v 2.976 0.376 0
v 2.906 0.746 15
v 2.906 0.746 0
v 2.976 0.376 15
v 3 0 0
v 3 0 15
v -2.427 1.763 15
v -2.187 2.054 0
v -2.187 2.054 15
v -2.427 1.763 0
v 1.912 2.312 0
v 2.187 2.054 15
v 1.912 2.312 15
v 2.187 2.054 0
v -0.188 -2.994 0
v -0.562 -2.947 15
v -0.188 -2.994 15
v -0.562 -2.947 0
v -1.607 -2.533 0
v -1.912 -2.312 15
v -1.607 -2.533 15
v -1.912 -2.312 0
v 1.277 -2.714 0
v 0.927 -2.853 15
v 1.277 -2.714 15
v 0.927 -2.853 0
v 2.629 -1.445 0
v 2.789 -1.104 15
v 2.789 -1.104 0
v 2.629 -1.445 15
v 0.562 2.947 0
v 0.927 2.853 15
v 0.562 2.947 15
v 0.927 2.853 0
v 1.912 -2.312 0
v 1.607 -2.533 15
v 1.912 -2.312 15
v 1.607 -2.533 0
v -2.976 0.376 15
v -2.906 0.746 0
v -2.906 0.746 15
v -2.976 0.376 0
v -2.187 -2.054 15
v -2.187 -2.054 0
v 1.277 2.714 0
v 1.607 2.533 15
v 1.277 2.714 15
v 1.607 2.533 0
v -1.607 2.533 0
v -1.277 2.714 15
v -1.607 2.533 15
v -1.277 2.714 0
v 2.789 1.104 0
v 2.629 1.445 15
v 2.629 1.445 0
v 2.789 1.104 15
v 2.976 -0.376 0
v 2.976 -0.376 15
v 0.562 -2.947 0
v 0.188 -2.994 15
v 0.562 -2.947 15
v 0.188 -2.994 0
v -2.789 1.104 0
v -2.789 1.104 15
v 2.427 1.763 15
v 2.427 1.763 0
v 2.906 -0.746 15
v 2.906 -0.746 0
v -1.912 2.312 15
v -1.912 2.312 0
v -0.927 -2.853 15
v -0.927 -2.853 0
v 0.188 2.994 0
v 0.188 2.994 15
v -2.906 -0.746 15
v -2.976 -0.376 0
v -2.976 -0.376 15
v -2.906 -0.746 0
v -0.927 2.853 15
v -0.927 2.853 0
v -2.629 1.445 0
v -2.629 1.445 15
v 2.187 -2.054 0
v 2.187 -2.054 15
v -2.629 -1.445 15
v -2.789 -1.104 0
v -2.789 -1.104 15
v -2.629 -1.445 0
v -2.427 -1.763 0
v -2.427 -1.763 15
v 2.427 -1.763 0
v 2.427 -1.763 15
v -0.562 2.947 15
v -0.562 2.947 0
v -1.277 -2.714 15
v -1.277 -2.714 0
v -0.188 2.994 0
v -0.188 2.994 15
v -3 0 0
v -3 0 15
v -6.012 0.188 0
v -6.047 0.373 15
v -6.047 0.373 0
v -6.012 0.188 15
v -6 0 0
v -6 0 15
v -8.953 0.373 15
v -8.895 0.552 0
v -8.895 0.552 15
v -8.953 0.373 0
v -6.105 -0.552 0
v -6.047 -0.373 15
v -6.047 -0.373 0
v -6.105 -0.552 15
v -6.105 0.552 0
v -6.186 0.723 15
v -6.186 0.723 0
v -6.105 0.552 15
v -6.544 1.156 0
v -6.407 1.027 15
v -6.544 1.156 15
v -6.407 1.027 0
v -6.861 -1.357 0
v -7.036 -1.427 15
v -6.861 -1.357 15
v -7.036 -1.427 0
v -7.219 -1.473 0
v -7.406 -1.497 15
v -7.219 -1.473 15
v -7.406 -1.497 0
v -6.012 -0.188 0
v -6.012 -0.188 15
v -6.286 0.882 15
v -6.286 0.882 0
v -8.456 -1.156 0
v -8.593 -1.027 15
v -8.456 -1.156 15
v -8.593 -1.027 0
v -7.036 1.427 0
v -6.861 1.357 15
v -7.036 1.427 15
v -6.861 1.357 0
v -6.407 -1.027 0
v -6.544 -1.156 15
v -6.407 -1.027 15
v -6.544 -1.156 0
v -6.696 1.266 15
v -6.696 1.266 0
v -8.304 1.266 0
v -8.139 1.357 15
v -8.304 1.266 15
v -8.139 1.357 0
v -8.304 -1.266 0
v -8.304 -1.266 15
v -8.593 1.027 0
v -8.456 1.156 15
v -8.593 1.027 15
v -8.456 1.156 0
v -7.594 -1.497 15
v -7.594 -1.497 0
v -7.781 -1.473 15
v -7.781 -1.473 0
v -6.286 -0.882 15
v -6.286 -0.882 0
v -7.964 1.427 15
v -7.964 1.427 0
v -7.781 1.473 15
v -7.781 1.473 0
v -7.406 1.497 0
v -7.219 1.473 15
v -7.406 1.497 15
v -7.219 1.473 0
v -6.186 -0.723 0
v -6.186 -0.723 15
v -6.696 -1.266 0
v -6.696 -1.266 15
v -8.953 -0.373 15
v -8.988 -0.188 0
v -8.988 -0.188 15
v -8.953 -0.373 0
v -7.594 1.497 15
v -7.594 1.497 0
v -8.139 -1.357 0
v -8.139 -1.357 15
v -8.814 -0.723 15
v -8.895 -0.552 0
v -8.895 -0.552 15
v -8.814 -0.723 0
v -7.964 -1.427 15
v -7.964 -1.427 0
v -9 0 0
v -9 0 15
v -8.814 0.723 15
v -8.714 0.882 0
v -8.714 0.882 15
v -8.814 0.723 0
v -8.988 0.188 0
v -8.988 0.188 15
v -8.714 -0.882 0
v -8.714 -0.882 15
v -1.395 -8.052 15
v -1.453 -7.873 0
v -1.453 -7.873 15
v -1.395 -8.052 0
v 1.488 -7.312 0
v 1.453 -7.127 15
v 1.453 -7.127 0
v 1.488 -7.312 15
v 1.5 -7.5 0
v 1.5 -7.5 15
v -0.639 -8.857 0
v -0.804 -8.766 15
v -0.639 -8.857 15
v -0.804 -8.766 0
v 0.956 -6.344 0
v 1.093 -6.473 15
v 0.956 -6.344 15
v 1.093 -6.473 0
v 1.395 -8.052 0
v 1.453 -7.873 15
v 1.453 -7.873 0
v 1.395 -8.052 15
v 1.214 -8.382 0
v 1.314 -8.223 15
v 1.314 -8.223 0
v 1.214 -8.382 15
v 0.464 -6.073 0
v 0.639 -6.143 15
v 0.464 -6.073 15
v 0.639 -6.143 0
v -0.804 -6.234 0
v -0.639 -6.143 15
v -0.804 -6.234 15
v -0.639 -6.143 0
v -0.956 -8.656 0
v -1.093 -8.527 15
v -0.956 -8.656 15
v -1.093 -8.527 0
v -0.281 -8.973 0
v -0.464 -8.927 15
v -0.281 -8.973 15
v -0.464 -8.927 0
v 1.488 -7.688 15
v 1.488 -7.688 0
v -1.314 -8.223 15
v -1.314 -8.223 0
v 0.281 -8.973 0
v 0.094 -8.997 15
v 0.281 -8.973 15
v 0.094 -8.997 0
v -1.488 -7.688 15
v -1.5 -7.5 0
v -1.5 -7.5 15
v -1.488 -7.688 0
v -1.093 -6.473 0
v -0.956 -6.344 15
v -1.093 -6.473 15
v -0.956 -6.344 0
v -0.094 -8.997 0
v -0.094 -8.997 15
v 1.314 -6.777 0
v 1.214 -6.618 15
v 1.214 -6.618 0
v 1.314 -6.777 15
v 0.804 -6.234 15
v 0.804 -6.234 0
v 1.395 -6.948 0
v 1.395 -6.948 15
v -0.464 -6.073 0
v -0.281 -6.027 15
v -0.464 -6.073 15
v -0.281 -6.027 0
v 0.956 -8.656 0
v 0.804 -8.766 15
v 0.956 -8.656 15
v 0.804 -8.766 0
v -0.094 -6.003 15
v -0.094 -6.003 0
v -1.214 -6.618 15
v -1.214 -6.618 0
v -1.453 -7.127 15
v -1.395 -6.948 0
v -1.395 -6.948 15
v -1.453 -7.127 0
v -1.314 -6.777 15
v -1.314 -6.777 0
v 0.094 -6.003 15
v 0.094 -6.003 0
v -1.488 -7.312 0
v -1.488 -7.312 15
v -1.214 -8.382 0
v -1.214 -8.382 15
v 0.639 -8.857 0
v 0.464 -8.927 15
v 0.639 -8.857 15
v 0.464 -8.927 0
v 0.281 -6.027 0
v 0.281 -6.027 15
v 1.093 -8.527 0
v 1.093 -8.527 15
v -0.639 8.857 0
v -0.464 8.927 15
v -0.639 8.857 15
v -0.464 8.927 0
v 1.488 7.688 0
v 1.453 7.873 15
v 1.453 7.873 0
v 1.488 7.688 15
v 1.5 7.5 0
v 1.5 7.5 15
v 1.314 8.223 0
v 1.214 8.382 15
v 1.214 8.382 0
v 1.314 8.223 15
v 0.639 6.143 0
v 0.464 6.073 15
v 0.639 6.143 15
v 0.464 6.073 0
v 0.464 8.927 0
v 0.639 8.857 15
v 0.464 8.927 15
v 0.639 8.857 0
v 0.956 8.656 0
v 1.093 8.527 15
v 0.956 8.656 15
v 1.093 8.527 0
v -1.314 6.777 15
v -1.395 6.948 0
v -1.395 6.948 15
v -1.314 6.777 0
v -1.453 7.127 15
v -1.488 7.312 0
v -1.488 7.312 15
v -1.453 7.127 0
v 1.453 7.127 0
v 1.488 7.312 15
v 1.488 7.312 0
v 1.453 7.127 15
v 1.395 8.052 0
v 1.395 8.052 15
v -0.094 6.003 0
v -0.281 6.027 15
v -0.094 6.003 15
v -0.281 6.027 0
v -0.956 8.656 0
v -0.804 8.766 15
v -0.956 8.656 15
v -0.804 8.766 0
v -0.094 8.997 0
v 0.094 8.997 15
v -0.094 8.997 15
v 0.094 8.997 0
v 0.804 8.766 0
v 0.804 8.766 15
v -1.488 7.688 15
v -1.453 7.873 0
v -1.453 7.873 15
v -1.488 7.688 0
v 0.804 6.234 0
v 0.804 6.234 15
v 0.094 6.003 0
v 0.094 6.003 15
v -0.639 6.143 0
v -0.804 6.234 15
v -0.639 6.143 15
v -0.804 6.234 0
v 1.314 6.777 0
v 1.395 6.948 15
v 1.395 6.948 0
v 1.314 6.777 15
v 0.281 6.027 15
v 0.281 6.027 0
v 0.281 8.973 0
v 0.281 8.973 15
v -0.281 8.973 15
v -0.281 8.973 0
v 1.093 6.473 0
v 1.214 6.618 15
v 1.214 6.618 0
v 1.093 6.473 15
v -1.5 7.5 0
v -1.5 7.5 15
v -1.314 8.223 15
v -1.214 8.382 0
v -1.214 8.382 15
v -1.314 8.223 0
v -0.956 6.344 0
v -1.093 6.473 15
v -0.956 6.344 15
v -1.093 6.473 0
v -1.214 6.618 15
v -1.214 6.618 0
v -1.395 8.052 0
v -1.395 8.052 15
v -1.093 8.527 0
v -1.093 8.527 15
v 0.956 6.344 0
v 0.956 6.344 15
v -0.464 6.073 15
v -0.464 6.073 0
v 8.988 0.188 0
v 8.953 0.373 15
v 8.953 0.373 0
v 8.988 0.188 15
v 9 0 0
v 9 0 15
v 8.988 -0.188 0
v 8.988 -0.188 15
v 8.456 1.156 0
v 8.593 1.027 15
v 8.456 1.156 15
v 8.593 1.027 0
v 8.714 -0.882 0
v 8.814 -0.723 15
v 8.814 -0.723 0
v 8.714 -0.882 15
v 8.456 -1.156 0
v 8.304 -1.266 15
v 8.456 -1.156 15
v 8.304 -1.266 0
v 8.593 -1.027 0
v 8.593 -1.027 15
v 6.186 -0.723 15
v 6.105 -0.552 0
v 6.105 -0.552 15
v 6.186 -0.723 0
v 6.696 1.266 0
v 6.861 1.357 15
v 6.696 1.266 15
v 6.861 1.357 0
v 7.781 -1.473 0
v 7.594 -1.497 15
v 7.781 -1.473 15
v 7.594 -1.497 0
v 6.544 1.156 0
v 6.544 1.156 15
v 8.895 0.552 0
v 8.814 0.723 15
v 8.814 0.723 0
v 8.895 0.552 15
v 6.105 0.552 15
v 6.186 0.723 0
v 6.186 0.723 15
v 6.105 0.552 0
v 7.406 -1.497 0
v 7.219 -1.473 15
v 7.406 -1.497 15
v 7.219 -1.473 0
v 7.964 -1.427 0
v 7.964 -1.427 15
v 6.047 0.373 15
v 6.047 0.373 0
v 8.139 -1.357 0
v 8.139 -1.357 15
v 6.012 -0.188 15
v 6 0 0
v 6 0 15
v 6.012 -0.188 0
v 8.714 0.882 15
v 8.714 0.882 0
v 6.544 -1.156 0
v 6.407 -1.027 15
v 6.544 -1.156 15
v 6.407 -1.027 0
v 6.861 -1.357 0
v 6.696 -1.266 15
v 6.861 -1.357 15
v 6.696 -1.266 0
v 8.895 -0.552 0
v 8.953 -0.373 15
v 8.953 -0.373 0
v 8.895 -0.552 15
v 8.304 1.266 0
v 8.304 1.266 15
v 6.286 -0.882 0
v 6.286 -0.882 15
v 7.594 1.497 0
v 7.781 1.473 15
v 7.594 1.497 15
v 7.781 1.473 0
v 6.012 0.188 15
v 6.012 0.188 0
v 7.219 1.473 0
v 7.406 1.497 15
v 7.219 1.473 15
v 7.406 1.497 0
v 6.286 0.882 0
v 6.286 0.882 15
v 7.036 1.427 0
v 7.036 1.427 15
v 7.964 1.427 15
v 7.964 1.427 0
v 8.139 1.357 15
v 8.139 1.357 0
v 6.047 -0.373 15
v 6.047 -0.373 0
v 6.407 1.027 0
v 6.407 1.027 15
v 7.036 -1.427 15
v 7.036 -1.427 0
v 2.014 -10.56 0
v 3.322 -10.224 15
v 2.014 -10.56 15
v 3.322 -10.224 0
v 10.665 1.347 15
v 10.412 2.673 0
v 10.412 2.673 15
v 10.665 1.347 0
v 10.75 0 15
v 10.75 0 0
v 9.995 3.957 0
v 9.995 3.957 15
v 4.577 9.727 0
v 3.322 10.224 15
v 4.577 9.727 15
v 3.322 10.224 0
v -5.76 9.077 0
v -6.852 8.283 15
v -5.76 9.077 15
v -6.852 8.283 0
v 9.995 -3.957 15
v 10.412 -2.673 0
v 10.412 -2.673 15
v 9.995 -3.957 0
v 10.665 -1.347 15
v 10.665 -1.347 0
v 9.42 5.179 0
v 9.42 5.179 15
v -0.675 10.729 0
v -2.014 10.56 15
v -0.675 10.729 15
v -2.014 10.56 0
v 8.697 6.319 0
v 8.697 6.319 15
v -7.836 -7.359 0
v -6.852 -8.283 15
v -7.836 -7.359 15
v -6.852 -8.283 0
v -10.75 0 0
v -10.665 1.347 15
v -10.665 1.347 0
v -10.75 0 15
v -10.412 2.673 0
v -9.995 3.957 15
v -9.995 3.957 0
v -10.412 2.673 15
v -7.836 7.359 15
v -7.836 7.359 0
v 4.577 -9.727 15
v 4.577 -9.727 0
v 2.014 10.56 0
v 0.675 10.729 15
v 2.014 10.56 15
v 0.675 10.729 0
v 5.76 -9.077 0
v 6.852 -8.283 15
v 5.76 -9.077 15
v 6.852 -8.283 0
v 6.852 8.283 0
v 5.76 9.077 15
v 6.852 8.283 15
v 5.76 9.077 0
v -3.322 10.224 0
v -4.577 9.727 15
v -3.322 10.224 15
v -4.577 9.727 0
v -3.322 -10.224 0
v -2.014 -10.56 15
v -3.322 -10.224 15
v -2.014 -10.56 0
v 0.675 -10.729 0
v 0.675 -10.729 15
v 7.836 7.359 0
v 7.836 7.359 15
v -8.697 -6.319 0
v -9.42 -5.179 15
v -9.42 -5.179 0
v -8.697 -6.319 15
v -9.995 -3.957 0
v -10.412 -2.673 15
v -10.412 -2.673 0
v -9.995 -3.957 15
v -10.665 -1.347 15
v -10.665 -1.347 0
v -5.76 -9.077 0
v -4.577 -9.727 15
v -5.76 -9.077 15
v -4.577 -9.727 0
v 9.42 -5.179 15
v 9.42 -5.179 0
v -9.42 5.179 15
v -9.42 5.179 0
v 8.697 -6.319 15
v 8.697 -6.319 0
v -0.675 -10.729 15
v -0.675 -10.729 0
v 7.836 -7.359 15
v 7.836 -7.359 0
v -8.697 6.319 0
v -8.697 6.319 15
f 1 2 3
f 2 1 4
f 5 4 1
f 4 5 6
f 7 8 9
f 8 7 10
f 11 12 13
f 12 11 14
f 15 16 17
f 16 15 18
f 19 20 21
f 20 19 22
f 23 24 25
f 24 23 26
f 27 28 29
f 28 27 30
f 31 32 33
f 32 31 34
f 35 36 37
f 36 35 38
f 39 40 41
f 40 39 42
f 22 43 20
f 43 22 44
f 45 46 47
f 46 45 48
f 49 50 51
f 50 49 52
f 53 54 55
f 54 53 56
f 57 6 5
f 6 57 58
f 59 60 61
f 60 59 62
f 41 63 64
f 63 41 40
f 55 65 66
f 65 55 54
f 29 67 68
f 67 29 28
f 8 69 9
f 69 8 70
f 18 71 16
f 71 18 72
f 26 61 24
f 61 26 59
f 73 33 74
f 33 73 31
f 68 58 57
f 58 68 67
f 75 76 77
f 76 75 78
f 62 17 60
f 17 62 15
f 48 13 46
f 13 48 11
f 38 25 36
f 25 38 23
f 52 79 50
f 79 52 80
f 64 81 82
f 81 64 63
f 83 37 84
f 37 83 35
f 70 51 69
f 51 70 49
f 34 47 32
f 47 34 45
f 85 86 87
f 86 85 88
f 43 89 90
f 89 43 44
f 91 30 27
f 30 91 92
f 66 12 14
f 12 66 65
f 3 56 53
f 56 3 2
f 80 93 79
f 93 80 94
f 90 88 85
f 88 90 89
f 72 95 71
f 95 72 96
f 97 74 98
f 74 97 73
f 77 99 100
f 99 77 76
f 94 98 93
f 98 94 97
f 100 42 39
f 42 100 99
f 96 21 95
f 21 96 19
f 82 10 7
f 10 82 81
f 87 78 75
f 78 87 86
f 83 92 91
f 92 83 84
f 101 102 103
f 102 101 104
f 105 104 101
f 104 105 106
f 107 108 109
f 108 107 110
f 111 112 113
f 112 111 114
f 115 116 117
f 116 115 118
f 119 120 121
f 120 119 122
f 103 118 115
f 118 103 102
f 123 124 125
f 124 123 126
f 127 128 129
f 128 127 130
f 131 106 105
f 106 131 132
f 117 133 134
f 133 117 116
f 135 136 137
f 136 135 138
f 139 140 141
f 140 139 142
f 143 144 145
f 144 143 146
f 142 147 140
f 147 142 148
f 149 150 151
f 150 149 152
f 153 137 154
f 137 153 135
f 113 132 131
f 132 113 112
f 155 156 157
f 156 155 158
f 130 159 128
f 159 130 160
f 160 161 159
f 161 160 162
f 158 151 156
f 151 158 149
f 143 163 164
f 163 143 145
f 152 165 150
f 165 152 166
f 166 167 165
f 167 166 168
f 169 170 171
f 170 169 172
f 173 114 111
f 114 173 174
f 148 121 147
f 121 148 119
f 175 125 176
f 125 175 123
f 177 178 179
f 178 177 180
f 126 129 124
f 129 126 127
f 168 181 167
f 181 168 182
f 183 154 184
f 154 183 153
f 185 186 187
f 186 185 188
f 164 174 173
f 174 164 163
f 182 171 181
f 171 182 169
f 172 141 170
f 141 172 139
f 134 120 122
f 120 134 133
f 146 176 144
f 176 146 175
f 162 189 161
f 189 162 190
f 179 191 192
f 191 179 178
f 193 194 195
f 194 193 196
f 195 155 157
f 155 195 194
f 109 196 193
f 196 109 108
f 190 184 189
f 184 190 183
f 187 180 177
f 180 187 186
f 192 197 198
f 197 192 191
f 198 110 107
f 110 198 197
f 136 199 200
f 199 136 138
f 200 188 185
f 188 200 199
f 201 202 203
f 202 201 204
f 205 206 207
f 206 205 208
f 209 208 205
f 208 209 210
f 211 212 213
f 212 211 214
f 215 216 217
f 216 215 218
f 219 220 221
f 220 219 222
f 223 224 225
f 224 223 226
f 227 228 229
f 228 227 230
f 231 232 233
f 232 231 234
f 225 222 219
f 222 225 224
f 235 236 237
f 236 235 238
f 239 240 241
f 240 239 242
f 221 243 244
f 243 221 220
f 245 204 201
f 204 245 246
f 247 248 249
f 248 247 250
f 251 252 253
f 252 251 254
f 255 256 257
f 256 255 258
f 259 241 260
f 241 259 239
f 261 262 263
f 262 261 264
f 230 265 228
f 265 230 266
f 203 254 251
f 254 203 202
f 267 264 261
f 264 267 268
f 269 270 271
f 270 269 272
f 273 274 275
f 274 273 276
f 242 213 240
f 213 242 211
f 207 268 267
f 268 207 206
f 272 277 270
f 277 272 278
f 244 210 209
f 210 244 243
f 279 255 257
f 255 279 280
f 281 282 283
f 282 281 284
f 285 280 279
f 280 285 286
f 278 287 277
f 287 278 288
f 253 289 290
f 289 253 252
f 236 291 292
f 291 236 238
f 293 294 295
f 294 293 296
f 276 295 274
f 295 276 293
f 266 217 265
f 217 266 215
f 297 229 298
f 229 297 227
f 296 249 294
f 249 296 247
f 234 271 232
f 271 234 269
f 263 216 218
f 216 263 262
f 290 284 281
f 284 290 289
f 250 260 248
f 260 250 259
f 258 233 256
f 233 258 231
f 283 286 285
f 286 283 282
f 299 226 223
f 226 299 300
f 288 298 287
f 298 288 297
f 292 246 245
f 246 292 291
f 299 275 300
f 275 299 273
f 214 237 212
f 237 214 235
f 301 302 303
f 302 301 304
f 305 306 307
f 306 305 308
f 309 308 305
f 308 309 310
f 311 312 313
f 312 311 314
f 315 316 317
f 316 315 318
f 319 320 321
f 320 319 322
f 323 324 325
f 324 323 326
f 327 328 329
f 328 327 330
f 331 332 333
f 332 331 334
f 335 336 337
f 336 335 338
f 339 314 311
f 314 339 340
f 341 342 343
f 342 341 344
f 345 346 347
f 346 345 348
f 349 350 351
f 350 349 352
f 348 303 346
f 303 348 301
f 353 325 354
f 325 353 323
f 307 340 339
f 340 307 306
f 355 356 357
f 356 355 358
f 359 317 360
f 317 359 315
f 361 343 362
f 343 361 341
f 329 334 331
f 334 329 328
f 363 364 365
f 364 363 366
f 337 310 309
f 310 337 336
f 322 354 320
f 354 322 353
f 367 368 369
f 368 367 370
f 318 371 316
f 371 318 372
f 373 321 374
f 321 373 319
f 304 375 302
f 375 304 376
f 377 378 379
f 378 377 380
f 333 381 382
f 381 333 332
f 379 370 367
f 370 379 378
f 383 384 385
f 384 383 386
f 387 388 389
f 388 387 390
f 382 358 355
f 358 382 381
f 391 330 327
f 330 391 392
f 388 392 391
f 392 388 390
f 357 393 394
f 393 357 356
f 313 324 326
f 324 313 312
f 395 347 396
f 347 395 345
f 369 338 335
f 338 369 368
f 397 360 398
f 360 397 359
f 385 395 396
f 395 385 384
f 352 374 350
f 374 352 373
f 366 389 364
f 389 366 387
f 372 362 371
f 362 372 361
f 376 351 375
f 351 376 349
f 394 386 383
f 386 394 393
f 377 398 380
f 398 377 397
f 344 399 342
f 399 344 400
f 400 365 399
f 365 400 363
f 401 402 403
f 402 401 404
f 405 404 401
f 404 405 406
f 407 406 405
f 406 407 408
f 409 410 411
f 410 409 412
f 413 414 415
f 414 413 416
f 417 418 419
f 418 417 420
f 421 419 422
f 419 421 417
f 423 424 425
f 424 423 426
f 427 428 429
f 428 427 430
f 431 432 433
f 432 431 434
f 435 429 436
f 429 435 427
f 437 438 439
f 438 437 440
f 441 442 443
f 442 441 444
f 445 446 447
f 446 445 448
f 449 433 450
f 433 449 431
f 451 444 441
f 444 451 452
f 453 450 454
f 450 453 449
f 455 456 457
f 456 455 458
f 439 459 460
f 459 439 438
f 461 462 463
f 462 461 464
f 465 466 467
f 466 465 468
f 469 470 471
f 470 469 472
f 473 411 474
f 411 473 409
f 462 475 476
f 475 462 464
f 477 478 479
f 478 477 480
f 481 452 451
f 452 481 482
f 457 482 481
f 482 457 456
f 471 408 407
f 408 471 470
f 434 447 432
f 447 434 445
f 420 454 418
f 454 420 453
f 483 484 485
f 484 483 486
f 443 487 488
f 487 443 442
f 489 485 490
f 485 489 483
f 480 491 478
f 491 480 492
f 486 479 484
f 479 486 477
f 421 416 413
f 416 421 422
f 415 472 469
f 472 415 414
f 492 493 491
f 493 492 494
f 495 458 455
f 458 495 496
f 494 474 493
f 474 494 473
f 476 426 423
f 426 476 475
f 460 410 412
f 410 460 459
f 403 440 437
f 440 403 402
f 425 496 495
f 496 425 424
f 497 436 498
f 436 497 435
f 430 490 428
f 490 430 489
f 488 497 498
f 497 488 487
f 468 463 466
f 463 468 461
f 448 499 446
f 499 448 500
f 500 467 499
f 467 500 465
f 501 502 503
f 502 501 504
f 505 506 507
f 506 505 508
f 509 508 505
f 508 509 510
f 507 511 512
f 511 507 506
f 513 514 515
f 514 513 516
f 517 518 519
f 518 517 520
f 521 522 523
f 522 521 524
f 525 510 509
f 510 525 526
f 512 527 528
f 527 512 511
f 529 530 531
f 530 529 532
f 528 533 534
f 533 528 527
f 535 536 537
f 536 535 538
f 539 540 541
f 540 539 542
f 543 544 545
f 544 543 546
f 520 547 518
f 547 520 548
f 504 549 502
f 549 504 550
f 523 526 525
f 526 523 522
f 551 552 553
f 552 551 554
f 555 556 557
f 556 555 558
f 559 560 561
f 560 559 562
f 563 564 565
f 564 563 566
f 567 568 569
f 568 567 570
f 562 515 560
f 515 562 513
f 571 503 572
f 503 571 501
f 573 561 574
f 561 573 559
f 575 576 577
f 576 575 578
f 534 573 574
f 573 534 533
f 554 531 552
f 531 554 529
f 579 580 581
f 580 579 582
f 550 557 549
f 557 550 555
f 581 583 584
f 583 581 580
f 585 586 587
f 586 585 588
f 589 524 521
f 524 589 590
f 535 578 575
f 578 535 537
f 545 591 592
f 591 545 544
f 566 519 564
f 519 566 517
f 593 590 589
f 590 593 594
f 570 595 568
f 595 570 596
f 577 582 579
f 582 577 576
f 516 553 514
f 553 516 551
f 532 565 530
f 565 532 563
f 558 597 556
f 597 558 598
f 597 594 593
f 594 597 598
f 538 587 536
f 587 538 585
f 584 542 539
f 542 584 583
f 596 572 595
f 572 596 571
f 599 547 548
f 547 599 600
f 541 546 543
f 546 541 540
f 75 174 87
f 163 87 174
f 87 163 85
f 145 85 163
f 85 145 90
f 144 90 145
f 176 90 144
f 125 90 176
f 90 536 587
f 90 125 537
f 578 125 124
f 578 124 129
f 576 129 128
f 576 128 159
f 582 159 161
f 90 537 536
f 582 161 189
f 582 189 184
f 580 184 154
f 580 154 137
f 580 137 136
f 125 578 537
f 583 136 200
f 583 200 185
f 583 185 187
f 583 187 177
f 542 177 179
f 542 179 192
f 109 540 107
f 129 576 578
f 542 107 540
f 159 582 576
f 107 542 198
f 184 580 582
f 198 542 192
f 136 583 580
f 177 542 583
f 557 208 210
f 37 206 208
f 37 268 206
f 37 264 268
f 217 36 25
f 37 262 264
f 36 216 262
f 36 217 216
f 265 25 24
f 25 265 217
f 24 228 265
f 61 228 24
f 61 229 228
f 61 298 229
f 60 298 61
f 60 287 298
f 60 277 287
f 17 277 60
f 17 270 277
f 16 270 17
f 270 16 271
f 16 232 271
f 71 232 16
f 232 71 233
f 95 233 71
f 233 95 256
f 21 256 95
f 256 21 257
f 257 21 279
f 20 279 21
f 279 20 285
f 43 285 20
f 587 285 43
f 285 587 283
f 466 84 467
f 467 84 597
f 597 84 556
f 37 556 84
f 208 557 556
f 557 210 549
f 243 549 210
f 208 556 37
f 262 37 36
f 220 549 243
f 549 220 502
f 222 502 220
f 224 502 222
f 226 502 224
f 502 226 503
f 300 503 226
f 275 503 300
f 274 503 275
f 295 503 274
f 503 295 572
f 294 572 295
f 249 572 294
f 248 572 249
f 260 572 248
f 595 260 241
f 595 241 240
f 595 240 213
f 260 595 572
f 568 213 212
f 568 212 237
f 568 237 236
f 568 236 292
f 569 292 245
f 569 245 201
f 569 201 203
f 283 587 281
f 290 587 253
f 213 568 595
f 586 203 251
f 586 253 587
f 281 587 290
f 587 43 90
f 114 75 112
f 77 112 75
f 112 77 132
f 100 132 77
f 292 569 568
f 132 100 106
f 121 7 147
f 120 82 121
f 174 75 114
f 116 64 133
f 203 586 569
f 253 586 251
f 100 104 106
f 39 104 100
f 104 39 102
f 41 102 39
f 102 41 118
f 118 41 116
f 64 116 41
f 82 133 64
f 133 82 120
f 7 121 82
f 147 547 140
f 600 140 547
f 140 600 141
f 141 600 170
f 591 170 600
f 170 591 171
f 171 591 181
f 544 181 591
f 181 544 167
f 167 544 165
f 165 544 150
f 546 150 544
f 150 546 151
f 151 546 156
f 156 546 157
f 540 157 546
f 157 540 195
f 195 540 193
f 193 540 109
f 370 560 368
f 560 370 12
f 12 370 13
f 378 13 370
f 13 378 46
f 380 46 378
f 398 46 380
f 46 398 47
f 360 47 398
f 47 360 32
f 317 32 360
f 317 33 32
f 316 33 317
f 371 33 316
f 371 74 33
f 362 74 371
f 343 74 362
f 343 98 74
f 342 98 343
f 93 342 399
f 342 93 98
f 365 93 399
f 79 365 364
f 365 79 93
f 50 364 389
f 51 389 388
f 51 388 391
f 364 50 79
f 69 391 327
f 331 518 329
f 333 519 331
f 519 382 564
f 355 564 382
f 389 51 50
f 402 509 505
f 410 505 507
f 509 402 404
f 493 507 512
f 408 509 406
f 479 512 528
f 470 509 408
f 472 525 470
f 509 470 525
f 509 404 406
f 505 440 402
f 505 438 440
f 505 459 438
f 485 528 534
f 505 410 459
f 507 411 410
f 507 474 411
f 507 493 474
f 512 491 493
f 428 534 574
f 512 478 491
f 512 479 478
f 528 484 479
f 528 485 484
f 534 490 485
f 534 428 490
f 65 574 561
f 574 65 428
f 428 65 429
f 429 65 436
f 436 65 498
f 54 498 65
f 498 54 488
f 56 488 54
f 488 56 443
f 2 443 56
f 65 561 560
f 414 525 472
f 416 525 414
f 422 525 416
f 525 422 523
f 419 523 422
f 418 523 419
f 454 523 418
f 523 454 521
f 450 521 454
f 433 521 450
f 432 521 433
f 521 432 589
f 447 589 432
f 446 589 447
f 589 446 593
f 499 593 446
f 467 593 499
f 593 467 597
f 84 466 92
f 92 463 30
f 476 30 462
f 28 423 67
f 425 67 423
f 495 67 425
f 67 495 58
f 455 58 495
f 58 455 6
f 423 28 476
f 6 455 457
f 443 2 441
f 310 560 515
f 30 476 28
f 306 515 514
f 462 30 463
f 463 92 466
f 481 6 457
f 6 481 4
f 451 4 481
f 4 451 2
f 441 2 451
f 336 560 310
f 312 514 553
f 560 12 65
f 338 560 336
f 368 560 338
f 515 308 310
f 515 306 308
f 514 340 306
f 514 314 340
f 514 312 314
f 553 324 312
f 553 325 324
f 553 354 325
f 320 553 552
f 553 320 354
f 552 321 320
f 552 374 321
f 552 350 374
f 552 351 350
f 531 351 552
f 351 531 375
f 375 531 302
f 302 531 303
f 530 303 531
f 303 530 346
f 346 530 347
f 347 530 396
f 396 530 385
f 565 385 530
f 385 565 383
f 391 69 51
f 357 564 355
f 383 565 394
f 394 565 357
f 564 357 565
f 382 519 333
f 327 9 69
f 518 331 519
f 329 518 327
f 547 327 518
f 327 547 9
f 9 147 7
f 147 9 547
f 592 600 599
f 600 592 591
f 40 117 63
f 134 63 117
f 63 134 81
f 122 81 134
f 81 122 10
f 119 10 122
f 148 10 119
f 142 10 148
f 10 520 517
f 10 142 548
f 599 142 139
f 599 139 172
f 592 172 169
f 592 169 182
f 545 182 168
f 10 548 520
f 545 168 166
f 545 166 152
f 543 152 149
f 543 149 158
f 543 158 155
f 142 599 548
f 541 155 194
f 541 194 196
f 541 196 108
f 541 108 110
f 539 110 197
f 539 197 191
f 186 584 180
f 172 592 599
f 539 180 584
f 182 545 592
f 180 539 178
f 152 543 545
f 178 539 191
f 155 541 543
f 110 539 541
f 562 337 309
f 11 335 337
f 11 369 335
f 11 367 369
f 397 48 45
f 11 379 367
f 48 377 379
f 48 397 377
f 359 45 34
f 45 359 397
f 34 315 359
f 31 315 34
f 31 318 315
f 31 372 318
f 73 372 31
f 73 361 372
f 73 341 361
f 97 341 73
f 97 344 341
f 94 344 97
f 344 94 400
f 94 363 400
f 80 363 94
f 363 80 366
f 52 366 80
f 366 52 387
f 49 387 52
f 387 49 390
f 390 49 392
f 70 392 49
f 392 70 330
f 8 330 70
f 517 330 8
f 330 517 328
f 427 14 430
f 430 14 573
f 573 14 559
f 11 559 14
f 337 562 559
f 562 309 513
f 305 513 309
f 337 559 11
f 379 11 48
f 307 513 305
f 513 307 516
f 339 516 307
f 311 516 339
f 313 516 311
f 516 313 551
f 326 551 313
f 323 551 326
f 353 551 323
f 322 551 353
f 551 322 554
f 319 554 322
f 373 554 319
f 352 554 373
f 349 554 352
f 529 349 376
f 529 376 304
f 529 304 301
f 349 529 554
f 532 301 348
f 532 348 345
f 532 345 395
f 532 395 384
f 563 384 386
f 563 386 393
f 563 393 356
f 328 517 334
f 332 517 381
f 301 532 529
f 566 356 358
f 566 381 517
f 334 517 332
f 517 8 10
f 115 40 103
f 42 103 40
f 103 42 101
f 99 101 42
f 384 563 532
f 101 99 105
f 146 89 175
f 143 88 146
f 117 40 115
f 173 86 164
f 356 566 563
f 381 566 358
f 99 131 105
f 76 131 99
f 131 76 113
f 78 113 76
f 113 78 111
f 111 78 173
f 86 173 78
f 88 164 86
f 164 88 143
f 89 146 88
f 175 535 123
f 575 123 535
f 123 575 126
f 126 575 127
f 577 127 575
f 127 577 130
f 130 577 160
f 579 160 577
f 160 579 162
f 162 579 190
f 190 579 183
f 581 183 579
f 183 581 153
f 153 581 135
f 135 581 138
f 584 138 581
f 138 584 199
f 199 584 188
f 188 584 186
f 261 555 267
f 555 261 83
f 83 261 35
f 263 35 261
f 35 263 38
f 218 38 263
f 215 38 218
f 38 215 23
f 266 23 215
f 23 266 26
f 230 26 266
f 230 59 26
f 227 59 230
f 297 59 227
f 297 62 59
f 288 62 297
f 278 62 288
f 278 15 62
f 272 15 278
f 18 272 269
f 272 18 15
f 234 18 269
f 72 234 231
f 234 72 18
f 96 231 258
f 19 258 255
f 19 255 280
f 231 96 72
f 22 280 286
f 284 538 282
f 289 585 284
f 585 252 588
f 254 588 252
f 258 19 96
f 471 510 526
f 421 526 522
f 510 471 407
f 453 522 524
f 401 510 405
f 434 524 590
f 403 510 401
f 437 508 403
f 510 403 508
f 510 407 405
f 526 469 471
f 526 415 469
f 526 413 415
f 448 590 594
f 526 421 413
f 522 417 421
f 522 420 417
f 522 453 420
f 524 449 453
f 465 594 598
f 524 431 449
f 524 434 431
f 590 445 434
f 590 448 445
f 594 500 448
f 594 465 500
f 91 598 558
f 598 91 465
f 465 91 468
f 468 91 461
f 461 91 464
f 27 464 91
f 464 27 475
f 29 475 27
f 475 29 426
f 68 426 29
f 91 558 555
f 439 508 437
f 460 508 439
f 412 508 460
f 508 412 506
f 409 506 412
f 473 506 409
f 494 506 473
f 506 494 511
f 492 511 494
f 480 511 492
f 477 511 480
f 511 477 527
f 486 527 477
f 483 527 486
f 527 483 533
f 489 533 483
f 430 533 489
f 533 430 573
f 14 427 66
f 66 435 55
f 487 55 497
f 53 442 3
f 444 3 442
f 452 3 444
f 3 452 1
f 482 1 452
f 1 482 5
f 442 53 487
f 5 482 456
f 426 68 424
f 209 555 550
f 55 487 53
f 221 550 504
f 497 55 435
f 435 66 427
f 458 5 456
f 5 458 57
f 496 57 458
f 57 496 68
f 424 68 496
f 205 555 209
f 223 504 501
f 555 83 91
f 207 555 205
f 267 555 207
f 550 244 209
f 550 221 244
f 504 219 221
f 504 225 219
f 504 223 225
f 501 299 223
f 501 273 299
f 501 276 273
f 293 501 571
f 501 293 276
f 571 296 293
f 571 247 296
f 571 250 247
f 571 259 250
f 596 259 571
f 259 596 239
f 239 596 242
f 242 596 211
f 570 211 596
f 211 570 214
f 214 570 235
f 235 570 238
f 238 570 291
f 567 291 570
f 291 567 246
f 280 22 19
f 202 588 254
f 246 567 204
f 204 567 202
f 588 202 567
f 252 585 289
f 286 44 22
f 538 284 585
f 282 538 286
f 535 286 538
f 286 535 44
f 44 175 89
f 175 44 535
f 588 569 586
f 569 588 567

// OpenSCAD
$fn = 50;


difference() {
	union() {
		*color(alpha = 1.0000000000, c = "gray") {
			translate(v = [0, 7, 0]) {
				linear_extrude(height = 1) {
					text(font = "Arial:style=Bold", halign = "center", size = 4.5000000000, text = "COMMENT circle main", valign = "center");
				}
			}
		}
		*color(alpha = 1.0000000000, c = "gray") {
			translate(v = [0, 14, 0]) {
				linear_extrude(height = 1.5000000000) {
					text(font = "Arial:style=Bold", halign = "center", size = 4.5000000000, text = "COMMENT description oobb_circle_shape_p_type_15_depth_1.5_diameter_15_thickness_1.5_width_1.5_height", valign = "center");
				}
			}
		}
		cylinder(h = 15, r = 10.7500000000);
	}
	union() {
		*color(alpha = 1.0000000000, c = "gray") {
			translate(v = [0, 7, 0]) {
				linear_extrude(height = 1) {
					text(font = "Arial:style=Bold", halign = "center", size = 4.5000000000, text = "COMMENT holes main", valign = "center");
				}
			}
		}
		*color(alpha = 1.0000000000, c = "gray") {
			translate(v = [0, 14, 0]) {
				linear_extrude(height = 1.5000000000) {
					text(font = "Arial:style=Bold", halign = "center", size = 4.5000000000, text = "COMMENT description oobb_holes_shape_n_type_1.5_diameter_15_thickness_1.5_width_1.5_height_true_both_holes_true_circle", valign = "center");
				}
			}
		}
		translate(v = [0.0000000000, 0.0000000000, -50.0000000000]) {
			cylinder(h = 100, r = 3.0000000000);
		}
		translate(v = [0.0000000000, 0.0000000000, -50.0000000000]) {
			cylinder(h = 100, r = 3.0000000000);
		}
		translate(v = [0.0000000000, 0.0000000000, -50.0000000000]) {
			cylinder(h = 100, r = 3.0000000000);
		}
		translate(v = [-7.5000000000, 0.0000000000, -50.0000000000]) {
			cylinder(h = 100, r = 1.5000000000);
		}
		translate(v = [0.0000000000, -7.5000000000, -50.0000000000]) {
			cylinder(h = 100, r = 1.5000000000);
		}
		translate(v = [0.0000000000, 0.0000000000, -50.0000000000]) {
			cylinder(h = 100, r = 1.5000000000);
		}
		translate(v = [0.0000000000, 7.5000000000, -50.0000000000]) {
			cylinder(h = 100, r = 1.5000000000);
		}
		translate(v = [7.5000000000, 0.0000000000, -50.0000000000]) {
			cylinder(h = 100, r = 1.5000000000);
		}
		translate(v = [-7.5000000000, 0.0000000000, -50.0000000000]) {
			cylinder(h = 100, r = 1.5000000000);
		}
		translate(v = [0.0000000000, -7.5000000000, -50.0000000000]) {
			cylinder(h = 100, r = 1.5000000000);
		}
		translate(v = [0.0000000000, 0.0000000000, -50.0000000000]) {
			cylinder(h = 100, r = 1.5000000000);
		}
		translate(v = [0.0000000000, 7.5000000000, -50.0000000000]) {
			cylinder(h = 100, r = 1.5000000000);
		}
		translate(v = [7.5000000000, 0.0000000000, -50.0000000000]) {
			cylinder(h = 100, r = 1.5000000000);
		}
		translate(v = [-7.5000000000, 0.0000000000, -50.0000000000]) {
			cylinder(h = 100, r = 1.5000000000);
		}
		translate(v = [0.0000000000, -7.5000000000, -50.0000000000]) {
			cylinder(h = 100, r = 1.5000000000);
		}
		translate(v = [0.0000000000, 0.0000000000, -50.0000000000]) {
			cylinder(h = 100, r = 1.5000000000);
		}
		translate(v = [0.0000000000, 7.5000000000, -50.0000000000]) {
			cylinder(h = 100, r = 1.5000000000);
		}
		translate(v = [7.5000000000, 0.0000000000, -50.0000000000]) {
			cylinder(h = 100, r = 1.5000000000);
		}
	}
}
